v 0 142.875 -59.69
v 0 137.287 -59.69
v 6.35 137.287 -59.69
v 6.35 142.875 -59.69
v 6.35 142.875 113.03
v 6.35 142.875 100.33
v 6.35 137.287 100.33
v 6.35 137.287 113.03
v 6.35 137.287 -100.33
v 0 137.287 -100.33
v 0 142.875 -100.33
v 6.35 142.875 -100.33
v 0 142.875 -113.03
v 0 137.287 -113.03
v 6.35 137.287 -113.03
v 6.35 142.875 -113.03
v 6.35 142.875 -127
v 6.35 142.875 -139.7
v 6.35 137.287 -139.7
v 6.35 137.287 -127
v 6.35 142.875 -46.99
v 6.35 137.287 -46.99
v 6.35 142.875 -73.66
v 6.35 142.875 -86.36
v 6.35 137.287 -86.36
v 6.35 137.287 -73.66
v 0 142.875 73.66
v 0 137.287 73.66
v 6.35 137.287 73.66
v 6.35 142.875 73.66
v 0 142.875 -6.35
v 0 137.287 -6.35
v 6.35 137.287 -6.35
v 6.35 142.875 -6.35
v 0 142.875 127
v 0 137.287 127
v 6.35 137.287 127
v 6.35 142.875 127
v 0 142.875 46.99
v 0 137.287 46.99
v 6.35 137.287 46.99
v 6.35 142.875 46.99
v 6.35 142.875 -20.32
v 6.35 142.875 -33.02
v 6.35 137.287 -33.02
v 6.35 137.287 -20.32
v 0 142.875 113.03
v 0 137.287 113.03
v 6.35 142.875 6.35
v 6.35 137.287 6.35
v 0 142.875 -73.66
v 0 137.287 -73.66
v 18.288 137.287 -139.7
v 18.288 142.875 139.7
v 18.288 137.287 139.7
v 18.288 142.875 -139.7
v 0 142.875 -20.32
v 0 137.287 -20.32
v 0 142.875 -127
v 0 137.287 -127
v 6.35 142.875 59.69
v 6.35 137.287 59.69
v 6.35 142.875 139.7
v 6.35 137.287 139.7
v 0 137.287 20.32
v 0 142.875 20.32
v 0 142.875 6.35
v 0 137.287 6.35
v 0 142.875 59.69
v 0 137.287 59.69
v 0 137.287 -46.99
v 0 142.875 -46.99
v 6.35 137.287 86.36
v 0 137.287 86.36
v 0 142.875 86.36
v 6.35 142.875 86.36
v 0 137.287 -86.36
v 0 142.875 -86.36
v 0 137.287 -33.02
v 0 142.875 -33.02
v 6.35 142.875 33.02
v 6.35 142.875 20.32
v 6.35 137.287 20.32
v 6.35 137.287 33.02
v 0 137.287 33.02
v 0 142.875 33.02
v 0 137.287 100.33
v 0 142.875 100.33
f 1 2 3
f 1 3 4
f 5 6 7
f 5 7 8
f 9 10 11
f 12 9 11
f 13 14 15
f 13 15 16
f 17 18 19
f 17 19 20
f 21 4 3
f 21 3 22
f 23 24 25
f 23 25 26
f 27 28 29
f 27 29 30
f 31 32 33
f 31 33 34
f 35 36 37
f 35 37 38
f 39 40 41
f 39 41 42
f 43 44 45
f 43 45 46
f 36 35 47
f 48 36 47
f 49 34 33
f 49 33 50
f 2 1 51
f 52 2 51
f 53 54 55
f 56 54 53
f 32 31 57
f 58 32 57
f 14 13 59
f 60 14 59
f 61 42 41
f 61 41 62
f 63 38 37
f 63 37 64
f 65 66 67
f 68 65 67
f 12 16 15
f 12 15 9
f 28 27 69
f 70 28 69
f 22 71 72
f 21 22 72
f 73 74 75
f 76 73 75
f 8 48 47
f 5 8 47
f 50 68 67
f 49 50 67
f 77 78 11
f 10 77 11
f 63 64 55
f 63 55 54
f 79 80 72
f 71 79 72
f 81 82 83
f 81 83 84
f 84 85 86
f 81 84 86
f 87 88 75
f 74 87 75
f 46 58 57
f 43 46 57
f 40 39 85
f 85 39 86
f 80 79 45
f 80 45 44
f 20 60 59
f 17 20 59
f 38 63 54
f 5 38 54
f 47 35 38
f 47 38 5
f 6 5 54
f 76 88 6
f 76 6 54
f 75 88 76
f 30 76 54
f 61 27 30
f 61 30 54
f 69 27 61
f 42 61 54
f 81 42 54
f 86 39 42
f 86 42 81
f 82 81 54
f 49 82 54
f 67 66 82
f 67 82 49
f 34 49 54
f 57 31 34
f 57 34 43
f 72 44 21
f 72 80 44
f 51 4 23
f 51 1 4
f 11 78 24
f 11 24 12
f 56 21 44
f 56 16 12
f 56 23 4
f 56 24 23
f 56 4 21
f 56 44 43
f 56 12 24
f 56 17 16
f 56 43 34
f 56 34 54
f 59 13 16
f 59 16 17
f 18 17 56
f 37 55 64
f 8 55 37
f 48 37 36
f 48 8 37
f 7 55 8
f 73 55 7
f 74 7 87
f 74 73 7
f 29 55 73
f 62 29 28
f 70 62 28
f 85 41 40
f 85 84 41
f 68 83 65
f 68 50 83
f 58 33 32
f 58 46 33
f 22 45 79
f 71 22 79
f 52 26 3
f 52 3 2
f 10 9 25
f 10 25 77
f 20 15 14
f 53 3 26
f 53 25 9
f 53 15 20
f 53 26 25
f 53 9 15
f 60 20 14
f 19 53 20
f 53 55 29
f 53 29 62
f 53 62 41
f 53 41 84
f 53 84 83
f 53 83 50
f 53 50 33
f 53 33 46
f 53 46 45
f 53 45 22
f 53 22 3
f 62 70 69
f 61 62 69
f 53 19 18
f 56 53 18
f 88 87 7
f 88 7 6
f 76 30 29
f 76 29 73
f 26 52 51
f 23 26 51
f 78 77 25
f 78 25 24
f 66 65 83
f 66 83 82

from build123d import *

# Parameters (mm, degrees)
SKETCH1_W           = 279.4
SKETCH1_H           = 285.75
BOSS_EXTRUDE1_DEPTH = 5.588
SKETCH2_W           = 279.4
SKETCH2_H           = 5.588
BOSS_EXTRUDE2_DEPTH = 12.7
CUT_EXTRUDE1_DEPTH  = 19.288
SKETCH5_W           = 64.162912319
SKETCH5_H           = 368.728813298
CUT_EXTRUDE2_DEPTH  = 280.4
SKETCH4_W           = 12.7
SKETCH4_H           = 5.588
CUT_EXTRUDE3_DEPTH  = 6.35


with BuildPart() as part:
    # Sketch1 → Boss-Extrude1 (new body)
    with BuildSketch(Plane(origin=(0, 0, 0), x_dir=(0, 0, -1), z_dir=(1, 0, 0))):
        Rectangle(SKETCH1_W, SKETCH1_H)
    extrude(amount=BOSS_EXTRUDE1_DEPTH)

    # Sketch2 → Boss-Extrude2 (add)
    with BuildSketch(Plane(origin=(5.588, 0, 0), x_dir=(0, 0, -1), z_dir=(1, 0, 0))):
        with Locations((0, 140.081)):
            Rectangle(SKETCH2_W, SKETCH2_H)
    extrude(amount=BOSS_EXTRUDE2_DEPTH)

    # Sketch3 → Cut-Extrude1 (cut, through all)
    with BuildSketch(Plane.ZY):
        with BuildLine():
            Line((-114.3, -85.725), (-25.4, -85.725))
            ThreePointArc((-25.4, -85.725), (-12.7, -98.425), (-25.4, -111.125))
            Line((-25.4, -111.125), (-114.3, -111.125))
            ThreePointArc((-114.3, -111.125), (-127, -98.425), (-114.3, -85.725))
        make_face()
    extrude(amount=-CUT_EXTRUDE1_DEPTH, mode=Mode.SUBTRACT)

    # Sketch5 → Cut-Extrude2 (cut, through all)
    with BuildSketch(Plane(origin=(0, 0, -139.7), x_dir=(-1, 0, 0), z_dir=(0, 0, -1))):
        with Locations((13.79345616, -47.077406649)):
            Rectangle(SKETCH5_W, SKETCH5_H)
    extrude(amount=-CUT_EXTRUDE2_DEPTH, mode=Mode.SUBTRACT)

    # Sketch4 → Cut-Extrude3 (cut)
    with BuildSketch(Plane.ZY):
        with Locations((-106.68, 140.081)):
            Rectangle(SKETCH4_W, SKETCH4_H)
        with Locations((-133.35, 140.081)):
            Rectangle(SKETCH4_W, SKETCH4_H)
        with Locations((-80.01, 140.081)):
            Rectangle(SKETCH4_W, SKETCH4_H)
        with Locations((-53.34, 140.081)):
            Rectangle(SKETCH4_W, SKETCH4_H)
        with Locations((-26.67, 140.081)):
            Rectangle(SKETCH4_W, SKETCH4_H)
        with Locations((0, 140.081)):
            Rectangle(SKETCH4_W, SKETCH4_H)
        with Locations((26.67, 140.081)):
            Rectangle(SKETCH4_W, SKETCH4_H)
        with Locations((53.34, 140.081)):
            Rectangle(SKETCH4_W, SKETCH4_H)
        with Locations((80.01, 140.081)):
            Rectangle(SKETCH4_W, SKETCH4_H)
        with Locations((106.68, 140.081)):
            Rectangle(SKETCH4_W, SKETCH4_H)
        with Locations((133.35, 140.081)):
            Rectangle(SKETCH4_W, SKETCH4_H)
    extrude(amount=-CUT_EXTRUDE3_DEPTH, mode=Mode.SUBTRACT)


solid = part.part
